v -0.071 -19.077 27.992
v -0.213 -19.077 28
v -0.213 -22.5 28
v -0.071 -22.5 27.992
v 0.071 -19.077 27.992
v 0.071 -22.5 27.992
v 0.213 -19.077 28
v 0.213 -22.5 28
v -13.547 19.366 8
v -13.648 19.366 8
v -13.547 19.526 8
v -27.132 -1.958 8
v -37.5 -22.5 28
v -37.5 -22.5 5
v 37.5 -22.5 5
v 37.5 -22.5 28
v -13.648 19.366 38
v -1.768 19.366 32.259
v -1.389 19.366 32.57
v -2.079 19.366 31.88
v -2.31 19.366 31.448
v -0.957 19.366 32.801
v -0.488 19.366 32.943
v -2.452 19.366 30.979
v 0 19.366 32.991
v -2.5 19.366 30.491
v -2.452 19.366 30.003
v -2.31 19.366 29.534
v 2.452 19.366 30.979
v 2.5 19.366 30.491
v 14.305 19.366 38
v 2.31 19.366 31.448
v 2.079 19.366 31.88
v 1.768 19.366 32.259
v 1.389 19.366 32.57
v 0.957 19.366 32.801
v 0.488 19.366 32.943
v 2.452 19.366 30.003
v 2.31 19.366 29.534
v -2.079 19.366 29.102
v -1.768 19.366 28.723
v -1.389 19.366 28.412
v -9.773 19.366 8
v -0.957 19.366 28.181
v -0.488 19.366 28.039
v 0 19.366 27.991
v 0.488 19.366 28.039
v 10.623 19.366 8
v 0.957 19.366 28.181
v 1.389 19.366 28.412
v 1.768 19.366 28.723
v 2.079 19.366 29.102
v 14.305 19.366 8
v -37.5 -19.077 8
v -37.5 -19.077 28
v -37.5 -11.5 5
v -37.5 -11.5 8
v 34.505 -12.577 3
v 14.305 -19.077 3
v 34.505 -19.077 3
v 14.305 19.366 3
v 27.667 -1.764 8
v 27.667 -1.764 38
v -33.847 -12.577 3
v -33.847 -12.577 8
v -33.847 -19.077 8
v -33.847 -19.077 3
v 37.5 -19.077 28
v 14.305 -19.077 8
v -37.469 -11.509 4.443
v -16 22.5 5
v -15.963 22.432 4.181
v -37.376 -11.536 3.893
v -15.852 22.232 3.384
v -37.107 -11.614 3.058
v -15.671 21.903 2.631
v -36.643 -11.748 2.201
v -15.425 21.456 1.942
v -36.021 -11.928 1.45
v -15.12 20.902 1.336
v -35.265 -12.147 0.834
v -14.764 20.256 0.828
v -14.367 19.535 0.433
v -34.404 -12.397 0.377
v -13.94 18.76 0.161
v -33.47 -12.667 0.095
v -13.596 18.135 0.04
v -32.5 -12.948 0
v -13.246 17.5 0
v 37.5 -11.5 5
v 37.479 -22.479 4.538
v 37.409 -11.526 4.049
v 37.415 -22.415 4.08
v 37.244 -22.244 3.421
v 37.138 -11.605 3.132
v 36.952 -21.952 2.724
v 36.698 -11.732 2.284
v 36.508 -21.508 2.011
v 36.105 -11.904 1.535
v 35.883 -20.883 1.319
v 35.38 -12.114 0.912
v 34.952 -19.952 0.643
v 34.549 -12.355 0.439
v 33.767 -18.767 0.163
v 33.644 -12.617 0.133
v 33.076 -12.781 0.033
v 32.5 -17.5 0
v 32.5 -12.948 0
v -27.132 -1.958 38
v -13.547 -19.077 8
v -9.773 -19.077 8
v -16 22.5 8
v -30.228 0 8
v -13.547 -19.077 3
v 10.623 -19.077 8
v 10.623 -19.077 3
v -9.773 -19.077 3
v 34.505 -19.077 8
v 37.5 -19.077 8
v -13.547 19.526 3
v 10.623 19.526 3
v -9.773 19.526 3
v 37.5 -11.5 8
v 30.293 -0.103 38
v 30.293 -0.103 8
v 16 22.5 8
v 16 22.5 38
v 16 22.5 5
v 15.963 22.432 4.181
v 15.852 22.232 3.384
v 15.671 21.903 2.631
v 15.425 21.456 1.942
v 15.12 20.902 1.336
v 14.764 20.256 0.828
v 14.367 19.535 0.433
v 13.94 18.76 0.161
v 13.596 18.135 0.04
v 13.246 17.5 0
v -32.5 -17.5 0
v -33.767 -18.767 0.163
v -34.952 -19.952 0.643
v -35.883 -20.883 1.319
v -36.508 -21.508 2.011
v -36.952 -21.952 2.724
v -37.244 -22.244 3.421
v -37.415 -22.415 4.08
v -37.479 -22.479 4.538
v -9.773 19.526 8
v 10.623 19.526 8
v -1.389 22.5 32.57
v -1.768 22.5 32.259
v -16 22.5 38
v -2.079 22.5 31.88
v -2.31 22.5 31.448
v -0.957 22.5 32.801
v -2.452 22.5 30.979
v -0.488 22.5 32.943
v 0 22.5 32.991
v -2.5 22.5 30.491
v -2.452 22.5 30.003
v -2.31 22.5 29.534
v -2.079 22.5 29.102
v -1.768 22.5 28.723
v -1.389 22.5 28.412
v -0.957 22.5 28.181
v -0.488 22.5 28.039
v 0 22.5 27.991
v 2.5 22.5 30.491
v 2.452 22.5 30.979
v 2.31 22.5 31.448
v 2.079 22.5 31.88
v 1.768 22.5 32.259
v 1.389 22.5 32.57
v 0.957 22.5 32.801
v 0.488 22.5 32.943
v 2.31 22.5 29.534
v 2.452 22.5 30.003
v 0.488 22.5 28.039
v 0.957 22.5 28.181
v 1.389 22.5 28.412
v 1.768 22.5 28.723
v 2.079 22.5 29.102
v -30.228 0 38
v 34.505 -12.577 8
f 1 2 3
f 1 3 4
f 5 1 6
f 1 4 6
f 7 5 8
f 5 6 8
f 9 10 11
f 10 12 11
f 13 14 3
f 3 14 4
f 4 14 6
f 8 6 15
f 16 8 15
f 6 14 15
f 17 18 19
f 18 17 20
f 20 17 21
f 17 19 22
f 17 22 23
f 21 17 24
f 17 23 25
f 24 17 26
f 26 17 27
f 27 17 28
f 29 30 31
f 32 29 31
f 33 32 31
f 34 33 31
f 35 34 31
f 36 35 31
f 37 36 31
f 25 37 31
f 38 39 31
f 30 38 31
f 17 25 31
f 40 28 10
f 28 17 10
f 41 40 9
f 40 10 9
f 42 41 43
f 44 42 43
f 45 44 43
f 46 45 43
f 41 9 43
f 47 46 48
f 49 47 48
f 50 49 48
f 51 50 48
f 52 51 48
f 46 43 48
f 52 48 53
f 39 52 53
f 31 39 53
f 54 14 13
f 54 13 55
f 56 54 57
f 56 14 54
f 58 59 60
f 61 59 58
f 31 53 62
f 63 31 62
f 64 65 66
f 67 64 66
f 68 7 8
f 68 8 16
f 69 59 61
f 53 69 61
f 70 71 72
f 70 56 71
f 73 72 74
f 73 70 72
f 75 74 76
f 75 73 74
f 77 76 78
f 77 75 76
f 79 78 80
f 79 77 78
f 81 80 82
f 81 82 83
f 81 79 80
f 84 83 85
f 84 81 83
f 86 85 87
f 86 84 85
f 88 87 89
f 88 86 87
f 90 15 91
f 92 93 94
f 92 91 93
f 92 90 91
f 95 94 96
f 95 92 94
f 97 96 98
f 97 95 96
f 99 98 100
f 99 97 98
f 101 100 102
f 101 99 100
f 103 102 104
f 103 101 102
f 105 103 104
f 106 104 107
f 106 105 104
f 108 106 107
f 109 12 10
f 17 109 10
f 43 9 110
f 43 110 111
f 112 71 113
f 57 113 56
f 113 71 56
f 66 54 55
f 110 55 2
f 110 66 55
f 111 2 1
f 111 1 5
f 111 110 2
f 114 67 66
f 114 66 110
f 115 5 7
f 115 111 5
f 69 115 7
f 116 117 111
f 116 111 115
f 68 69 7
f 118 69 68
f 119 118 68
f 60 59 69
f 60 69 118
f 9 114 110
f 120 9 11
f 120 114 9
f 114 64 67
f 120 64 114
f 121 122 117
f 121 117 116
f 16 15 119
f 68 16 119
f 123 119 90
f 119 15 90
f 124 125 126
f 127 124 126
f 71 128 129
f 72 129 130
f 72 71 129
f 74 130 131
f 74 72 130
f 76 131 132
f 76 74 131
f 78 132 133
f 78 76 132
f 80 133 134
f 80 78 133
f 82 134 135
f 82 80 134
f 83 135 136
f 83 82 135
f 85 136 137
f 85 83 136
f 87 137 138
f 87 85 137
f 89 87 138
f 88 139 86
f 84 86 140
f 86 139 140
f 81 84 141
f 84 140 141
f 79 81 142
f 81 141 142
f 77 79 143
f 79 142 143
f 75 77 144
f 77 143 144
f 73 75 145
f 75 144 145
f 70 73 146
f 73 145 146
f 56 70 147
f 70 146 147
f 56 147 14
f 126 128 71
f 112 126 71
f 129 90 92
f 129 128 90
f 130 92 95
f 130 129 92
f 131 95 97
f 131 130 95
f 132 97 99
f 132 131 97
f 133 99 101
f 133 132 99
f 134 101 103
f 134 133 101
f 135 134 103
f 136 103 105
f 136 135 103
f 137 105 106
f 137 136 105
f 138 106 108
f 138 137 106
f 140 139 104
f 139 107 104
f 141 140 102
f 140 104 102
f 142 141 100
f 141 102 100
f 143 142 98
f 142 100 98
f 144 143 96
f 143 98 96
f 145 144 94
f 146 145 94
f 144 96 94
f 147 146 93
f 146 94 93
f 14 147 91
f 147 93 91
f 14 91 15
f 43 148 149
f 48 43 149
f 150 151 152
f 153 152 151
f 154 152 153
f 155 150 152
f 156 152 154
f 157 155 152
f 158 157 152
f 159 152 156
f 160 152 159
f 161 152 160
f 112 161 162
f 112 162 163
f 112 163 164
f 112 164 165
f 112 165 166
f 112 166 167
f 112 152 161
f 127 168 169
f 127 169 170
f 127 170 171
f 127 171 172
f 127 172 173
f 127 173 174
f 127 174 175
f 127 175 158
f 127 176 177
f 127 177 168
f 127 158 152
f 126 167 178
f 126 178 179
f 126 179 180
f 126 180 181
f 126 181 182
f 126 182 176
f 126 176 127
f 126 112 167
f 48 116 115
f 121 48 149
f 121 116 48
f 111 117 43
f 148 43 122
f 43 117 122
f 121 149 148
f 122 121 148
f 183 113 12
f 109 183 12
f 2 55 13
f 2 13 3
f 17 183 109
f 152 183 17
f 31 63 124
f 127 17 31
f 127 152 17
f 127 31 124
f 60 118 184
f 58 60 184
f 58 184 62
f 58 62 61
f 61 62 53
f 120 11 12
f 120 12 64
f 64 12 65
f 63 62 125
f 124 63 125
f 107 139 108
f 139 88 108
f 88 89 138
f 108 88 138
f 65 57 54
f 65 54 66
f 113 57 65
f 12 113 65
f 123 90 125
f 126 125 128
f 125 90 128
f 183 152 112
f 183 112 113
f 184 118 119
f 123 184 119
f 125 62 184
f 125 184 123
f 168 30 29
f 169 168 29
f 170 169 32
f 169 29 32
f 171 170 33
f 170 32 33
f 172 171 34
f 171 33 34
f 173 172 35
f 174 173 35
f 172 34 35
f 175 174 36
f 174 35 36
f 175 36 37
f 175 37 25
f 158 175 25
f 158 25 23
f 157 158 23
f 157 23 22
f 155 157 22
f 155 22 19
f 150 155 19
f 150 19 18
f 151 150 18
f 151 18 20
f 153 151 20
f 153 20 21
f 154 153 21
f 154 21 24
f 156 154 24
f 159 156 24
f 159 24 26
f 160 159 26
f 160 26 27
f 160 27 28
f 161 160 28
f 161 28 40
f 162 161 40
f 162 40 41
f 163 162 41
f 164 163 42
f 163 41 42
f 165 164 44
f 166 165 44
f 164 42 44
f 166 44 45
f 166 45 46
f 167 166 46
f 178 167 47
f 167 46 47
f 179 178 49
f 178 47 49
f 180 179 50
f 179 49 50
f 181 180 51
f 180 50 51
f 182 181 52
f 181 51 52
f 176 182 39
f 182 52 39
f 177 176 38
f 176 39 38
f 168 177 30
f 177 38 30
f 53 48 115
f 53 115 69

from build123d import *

# Parameters (mm, degrees)
F1_DEPTH  = 8
F3_DEPTH  = 5
F4_W      = 3.773983
F4_H      = 38.603006
F4_W_2    = 3.682556
F5_DEPTH  = 5
F6_W      = 75
F6_H      = 3.42278
F7_DEPTH  = 20
F8_W      = 32
F8_H      = 3.133789
F9_DEPTH  = 30
F11_DEPTH = 30
F13_DEPTH = 30
F14_R     = 5
F16_D     = 5


with BuildPart() as f1:
    # F0 (on Top) → F1 (new body)
    with BuildSketch(Plane.XY):
        Polygon((-37.5, -22.5), (37.5, -22.5), (37.5, -11.5), (16, 22.5), (-16, 22.5), (-37.5, -11.5), align=None)
    extrude(amount=F1_DEPTH)

    # F2 (on face) → F3 (cut)
    with BuildSketch(Plane.XY.offset(8)):
        Polygon((-13.546915, 19.525786), (-33.847345, -12.57722), (-33.847345, -19.07722), (34.50483, -19.07722), (34.50483, -12.57722), (14.2044, 19.525786), align=None)
    extrude(amount=-F3_DEPTH, mode=Mode.SUBTRACT)

    # F4 (on face) → F5 (join)
    with BuildSketch(Plane.XY.offset(3)):
        with Locations((-11.659923, 0.224283)):
            Rectangle(F4_W, F4_H)
        with Locations((12.46403, 0.224283)):
            Rectangle(F4_W_2, F4_H)
    extrude(amount=F5_DEPTH)

    # F6 (on face) → F7 (join)
    with BuildSketch(Plane.XY.offset(8)):
        with Locations((0, -20.78861)):
            Rectangle(F6_W, F6_H)
    extrude(amount=F7_DEPTH)

    # F8 (on face) → F9 (join)
    with BuildSketch(Plane.XY.offset(8)):
        with Locations((0, 20.933105)):
            Rectangle(F8_W, F8_H)
    extrude(amount=F9_DEPTH)

    # F10 (on face) → F11 (join)
    with BuildSketch(Plane.XY.offset(8)):
        Polygon((-13.647822, 19.366211), (-16, 22.5), (-30.227941, 0), (-27.132055, -1.957692), align=None)
    extrude(amount=F11_DEPTH)

    # F12 (on face) → F13 (join)
    with BuildSketch(Plane.XY.offset(8)):
        Polygon((16, 22.5), (14.305308, 19.366211), (27.666821, -1.763624), (30.293031, -0.102933), align=None)
    extrude(amount=F13_DEPTH)

    # F14
    f14_edges = [f1.edges().sort_by_distance(p)[0] for p in [
        (0, -22.5, 0),
        (-37.5, -17, 0),
        (37.5, -17, 0),
        (26.75, 5.5, 0),
        (0, 22.5, 0),
        (-26.75, 5.5, 0),
    ]]
    fillet(f14_edges, radius=F14_R)

    # F16 (through all)
    with Locations(Plane(origin=(0, 22.5, 0), x_dir=(-1, 0, 0), z_dir=(0, 1, 0))):
        with Locations((0, 30.490936)):
            Hole(F16_D / 2)


solid = f1.part
